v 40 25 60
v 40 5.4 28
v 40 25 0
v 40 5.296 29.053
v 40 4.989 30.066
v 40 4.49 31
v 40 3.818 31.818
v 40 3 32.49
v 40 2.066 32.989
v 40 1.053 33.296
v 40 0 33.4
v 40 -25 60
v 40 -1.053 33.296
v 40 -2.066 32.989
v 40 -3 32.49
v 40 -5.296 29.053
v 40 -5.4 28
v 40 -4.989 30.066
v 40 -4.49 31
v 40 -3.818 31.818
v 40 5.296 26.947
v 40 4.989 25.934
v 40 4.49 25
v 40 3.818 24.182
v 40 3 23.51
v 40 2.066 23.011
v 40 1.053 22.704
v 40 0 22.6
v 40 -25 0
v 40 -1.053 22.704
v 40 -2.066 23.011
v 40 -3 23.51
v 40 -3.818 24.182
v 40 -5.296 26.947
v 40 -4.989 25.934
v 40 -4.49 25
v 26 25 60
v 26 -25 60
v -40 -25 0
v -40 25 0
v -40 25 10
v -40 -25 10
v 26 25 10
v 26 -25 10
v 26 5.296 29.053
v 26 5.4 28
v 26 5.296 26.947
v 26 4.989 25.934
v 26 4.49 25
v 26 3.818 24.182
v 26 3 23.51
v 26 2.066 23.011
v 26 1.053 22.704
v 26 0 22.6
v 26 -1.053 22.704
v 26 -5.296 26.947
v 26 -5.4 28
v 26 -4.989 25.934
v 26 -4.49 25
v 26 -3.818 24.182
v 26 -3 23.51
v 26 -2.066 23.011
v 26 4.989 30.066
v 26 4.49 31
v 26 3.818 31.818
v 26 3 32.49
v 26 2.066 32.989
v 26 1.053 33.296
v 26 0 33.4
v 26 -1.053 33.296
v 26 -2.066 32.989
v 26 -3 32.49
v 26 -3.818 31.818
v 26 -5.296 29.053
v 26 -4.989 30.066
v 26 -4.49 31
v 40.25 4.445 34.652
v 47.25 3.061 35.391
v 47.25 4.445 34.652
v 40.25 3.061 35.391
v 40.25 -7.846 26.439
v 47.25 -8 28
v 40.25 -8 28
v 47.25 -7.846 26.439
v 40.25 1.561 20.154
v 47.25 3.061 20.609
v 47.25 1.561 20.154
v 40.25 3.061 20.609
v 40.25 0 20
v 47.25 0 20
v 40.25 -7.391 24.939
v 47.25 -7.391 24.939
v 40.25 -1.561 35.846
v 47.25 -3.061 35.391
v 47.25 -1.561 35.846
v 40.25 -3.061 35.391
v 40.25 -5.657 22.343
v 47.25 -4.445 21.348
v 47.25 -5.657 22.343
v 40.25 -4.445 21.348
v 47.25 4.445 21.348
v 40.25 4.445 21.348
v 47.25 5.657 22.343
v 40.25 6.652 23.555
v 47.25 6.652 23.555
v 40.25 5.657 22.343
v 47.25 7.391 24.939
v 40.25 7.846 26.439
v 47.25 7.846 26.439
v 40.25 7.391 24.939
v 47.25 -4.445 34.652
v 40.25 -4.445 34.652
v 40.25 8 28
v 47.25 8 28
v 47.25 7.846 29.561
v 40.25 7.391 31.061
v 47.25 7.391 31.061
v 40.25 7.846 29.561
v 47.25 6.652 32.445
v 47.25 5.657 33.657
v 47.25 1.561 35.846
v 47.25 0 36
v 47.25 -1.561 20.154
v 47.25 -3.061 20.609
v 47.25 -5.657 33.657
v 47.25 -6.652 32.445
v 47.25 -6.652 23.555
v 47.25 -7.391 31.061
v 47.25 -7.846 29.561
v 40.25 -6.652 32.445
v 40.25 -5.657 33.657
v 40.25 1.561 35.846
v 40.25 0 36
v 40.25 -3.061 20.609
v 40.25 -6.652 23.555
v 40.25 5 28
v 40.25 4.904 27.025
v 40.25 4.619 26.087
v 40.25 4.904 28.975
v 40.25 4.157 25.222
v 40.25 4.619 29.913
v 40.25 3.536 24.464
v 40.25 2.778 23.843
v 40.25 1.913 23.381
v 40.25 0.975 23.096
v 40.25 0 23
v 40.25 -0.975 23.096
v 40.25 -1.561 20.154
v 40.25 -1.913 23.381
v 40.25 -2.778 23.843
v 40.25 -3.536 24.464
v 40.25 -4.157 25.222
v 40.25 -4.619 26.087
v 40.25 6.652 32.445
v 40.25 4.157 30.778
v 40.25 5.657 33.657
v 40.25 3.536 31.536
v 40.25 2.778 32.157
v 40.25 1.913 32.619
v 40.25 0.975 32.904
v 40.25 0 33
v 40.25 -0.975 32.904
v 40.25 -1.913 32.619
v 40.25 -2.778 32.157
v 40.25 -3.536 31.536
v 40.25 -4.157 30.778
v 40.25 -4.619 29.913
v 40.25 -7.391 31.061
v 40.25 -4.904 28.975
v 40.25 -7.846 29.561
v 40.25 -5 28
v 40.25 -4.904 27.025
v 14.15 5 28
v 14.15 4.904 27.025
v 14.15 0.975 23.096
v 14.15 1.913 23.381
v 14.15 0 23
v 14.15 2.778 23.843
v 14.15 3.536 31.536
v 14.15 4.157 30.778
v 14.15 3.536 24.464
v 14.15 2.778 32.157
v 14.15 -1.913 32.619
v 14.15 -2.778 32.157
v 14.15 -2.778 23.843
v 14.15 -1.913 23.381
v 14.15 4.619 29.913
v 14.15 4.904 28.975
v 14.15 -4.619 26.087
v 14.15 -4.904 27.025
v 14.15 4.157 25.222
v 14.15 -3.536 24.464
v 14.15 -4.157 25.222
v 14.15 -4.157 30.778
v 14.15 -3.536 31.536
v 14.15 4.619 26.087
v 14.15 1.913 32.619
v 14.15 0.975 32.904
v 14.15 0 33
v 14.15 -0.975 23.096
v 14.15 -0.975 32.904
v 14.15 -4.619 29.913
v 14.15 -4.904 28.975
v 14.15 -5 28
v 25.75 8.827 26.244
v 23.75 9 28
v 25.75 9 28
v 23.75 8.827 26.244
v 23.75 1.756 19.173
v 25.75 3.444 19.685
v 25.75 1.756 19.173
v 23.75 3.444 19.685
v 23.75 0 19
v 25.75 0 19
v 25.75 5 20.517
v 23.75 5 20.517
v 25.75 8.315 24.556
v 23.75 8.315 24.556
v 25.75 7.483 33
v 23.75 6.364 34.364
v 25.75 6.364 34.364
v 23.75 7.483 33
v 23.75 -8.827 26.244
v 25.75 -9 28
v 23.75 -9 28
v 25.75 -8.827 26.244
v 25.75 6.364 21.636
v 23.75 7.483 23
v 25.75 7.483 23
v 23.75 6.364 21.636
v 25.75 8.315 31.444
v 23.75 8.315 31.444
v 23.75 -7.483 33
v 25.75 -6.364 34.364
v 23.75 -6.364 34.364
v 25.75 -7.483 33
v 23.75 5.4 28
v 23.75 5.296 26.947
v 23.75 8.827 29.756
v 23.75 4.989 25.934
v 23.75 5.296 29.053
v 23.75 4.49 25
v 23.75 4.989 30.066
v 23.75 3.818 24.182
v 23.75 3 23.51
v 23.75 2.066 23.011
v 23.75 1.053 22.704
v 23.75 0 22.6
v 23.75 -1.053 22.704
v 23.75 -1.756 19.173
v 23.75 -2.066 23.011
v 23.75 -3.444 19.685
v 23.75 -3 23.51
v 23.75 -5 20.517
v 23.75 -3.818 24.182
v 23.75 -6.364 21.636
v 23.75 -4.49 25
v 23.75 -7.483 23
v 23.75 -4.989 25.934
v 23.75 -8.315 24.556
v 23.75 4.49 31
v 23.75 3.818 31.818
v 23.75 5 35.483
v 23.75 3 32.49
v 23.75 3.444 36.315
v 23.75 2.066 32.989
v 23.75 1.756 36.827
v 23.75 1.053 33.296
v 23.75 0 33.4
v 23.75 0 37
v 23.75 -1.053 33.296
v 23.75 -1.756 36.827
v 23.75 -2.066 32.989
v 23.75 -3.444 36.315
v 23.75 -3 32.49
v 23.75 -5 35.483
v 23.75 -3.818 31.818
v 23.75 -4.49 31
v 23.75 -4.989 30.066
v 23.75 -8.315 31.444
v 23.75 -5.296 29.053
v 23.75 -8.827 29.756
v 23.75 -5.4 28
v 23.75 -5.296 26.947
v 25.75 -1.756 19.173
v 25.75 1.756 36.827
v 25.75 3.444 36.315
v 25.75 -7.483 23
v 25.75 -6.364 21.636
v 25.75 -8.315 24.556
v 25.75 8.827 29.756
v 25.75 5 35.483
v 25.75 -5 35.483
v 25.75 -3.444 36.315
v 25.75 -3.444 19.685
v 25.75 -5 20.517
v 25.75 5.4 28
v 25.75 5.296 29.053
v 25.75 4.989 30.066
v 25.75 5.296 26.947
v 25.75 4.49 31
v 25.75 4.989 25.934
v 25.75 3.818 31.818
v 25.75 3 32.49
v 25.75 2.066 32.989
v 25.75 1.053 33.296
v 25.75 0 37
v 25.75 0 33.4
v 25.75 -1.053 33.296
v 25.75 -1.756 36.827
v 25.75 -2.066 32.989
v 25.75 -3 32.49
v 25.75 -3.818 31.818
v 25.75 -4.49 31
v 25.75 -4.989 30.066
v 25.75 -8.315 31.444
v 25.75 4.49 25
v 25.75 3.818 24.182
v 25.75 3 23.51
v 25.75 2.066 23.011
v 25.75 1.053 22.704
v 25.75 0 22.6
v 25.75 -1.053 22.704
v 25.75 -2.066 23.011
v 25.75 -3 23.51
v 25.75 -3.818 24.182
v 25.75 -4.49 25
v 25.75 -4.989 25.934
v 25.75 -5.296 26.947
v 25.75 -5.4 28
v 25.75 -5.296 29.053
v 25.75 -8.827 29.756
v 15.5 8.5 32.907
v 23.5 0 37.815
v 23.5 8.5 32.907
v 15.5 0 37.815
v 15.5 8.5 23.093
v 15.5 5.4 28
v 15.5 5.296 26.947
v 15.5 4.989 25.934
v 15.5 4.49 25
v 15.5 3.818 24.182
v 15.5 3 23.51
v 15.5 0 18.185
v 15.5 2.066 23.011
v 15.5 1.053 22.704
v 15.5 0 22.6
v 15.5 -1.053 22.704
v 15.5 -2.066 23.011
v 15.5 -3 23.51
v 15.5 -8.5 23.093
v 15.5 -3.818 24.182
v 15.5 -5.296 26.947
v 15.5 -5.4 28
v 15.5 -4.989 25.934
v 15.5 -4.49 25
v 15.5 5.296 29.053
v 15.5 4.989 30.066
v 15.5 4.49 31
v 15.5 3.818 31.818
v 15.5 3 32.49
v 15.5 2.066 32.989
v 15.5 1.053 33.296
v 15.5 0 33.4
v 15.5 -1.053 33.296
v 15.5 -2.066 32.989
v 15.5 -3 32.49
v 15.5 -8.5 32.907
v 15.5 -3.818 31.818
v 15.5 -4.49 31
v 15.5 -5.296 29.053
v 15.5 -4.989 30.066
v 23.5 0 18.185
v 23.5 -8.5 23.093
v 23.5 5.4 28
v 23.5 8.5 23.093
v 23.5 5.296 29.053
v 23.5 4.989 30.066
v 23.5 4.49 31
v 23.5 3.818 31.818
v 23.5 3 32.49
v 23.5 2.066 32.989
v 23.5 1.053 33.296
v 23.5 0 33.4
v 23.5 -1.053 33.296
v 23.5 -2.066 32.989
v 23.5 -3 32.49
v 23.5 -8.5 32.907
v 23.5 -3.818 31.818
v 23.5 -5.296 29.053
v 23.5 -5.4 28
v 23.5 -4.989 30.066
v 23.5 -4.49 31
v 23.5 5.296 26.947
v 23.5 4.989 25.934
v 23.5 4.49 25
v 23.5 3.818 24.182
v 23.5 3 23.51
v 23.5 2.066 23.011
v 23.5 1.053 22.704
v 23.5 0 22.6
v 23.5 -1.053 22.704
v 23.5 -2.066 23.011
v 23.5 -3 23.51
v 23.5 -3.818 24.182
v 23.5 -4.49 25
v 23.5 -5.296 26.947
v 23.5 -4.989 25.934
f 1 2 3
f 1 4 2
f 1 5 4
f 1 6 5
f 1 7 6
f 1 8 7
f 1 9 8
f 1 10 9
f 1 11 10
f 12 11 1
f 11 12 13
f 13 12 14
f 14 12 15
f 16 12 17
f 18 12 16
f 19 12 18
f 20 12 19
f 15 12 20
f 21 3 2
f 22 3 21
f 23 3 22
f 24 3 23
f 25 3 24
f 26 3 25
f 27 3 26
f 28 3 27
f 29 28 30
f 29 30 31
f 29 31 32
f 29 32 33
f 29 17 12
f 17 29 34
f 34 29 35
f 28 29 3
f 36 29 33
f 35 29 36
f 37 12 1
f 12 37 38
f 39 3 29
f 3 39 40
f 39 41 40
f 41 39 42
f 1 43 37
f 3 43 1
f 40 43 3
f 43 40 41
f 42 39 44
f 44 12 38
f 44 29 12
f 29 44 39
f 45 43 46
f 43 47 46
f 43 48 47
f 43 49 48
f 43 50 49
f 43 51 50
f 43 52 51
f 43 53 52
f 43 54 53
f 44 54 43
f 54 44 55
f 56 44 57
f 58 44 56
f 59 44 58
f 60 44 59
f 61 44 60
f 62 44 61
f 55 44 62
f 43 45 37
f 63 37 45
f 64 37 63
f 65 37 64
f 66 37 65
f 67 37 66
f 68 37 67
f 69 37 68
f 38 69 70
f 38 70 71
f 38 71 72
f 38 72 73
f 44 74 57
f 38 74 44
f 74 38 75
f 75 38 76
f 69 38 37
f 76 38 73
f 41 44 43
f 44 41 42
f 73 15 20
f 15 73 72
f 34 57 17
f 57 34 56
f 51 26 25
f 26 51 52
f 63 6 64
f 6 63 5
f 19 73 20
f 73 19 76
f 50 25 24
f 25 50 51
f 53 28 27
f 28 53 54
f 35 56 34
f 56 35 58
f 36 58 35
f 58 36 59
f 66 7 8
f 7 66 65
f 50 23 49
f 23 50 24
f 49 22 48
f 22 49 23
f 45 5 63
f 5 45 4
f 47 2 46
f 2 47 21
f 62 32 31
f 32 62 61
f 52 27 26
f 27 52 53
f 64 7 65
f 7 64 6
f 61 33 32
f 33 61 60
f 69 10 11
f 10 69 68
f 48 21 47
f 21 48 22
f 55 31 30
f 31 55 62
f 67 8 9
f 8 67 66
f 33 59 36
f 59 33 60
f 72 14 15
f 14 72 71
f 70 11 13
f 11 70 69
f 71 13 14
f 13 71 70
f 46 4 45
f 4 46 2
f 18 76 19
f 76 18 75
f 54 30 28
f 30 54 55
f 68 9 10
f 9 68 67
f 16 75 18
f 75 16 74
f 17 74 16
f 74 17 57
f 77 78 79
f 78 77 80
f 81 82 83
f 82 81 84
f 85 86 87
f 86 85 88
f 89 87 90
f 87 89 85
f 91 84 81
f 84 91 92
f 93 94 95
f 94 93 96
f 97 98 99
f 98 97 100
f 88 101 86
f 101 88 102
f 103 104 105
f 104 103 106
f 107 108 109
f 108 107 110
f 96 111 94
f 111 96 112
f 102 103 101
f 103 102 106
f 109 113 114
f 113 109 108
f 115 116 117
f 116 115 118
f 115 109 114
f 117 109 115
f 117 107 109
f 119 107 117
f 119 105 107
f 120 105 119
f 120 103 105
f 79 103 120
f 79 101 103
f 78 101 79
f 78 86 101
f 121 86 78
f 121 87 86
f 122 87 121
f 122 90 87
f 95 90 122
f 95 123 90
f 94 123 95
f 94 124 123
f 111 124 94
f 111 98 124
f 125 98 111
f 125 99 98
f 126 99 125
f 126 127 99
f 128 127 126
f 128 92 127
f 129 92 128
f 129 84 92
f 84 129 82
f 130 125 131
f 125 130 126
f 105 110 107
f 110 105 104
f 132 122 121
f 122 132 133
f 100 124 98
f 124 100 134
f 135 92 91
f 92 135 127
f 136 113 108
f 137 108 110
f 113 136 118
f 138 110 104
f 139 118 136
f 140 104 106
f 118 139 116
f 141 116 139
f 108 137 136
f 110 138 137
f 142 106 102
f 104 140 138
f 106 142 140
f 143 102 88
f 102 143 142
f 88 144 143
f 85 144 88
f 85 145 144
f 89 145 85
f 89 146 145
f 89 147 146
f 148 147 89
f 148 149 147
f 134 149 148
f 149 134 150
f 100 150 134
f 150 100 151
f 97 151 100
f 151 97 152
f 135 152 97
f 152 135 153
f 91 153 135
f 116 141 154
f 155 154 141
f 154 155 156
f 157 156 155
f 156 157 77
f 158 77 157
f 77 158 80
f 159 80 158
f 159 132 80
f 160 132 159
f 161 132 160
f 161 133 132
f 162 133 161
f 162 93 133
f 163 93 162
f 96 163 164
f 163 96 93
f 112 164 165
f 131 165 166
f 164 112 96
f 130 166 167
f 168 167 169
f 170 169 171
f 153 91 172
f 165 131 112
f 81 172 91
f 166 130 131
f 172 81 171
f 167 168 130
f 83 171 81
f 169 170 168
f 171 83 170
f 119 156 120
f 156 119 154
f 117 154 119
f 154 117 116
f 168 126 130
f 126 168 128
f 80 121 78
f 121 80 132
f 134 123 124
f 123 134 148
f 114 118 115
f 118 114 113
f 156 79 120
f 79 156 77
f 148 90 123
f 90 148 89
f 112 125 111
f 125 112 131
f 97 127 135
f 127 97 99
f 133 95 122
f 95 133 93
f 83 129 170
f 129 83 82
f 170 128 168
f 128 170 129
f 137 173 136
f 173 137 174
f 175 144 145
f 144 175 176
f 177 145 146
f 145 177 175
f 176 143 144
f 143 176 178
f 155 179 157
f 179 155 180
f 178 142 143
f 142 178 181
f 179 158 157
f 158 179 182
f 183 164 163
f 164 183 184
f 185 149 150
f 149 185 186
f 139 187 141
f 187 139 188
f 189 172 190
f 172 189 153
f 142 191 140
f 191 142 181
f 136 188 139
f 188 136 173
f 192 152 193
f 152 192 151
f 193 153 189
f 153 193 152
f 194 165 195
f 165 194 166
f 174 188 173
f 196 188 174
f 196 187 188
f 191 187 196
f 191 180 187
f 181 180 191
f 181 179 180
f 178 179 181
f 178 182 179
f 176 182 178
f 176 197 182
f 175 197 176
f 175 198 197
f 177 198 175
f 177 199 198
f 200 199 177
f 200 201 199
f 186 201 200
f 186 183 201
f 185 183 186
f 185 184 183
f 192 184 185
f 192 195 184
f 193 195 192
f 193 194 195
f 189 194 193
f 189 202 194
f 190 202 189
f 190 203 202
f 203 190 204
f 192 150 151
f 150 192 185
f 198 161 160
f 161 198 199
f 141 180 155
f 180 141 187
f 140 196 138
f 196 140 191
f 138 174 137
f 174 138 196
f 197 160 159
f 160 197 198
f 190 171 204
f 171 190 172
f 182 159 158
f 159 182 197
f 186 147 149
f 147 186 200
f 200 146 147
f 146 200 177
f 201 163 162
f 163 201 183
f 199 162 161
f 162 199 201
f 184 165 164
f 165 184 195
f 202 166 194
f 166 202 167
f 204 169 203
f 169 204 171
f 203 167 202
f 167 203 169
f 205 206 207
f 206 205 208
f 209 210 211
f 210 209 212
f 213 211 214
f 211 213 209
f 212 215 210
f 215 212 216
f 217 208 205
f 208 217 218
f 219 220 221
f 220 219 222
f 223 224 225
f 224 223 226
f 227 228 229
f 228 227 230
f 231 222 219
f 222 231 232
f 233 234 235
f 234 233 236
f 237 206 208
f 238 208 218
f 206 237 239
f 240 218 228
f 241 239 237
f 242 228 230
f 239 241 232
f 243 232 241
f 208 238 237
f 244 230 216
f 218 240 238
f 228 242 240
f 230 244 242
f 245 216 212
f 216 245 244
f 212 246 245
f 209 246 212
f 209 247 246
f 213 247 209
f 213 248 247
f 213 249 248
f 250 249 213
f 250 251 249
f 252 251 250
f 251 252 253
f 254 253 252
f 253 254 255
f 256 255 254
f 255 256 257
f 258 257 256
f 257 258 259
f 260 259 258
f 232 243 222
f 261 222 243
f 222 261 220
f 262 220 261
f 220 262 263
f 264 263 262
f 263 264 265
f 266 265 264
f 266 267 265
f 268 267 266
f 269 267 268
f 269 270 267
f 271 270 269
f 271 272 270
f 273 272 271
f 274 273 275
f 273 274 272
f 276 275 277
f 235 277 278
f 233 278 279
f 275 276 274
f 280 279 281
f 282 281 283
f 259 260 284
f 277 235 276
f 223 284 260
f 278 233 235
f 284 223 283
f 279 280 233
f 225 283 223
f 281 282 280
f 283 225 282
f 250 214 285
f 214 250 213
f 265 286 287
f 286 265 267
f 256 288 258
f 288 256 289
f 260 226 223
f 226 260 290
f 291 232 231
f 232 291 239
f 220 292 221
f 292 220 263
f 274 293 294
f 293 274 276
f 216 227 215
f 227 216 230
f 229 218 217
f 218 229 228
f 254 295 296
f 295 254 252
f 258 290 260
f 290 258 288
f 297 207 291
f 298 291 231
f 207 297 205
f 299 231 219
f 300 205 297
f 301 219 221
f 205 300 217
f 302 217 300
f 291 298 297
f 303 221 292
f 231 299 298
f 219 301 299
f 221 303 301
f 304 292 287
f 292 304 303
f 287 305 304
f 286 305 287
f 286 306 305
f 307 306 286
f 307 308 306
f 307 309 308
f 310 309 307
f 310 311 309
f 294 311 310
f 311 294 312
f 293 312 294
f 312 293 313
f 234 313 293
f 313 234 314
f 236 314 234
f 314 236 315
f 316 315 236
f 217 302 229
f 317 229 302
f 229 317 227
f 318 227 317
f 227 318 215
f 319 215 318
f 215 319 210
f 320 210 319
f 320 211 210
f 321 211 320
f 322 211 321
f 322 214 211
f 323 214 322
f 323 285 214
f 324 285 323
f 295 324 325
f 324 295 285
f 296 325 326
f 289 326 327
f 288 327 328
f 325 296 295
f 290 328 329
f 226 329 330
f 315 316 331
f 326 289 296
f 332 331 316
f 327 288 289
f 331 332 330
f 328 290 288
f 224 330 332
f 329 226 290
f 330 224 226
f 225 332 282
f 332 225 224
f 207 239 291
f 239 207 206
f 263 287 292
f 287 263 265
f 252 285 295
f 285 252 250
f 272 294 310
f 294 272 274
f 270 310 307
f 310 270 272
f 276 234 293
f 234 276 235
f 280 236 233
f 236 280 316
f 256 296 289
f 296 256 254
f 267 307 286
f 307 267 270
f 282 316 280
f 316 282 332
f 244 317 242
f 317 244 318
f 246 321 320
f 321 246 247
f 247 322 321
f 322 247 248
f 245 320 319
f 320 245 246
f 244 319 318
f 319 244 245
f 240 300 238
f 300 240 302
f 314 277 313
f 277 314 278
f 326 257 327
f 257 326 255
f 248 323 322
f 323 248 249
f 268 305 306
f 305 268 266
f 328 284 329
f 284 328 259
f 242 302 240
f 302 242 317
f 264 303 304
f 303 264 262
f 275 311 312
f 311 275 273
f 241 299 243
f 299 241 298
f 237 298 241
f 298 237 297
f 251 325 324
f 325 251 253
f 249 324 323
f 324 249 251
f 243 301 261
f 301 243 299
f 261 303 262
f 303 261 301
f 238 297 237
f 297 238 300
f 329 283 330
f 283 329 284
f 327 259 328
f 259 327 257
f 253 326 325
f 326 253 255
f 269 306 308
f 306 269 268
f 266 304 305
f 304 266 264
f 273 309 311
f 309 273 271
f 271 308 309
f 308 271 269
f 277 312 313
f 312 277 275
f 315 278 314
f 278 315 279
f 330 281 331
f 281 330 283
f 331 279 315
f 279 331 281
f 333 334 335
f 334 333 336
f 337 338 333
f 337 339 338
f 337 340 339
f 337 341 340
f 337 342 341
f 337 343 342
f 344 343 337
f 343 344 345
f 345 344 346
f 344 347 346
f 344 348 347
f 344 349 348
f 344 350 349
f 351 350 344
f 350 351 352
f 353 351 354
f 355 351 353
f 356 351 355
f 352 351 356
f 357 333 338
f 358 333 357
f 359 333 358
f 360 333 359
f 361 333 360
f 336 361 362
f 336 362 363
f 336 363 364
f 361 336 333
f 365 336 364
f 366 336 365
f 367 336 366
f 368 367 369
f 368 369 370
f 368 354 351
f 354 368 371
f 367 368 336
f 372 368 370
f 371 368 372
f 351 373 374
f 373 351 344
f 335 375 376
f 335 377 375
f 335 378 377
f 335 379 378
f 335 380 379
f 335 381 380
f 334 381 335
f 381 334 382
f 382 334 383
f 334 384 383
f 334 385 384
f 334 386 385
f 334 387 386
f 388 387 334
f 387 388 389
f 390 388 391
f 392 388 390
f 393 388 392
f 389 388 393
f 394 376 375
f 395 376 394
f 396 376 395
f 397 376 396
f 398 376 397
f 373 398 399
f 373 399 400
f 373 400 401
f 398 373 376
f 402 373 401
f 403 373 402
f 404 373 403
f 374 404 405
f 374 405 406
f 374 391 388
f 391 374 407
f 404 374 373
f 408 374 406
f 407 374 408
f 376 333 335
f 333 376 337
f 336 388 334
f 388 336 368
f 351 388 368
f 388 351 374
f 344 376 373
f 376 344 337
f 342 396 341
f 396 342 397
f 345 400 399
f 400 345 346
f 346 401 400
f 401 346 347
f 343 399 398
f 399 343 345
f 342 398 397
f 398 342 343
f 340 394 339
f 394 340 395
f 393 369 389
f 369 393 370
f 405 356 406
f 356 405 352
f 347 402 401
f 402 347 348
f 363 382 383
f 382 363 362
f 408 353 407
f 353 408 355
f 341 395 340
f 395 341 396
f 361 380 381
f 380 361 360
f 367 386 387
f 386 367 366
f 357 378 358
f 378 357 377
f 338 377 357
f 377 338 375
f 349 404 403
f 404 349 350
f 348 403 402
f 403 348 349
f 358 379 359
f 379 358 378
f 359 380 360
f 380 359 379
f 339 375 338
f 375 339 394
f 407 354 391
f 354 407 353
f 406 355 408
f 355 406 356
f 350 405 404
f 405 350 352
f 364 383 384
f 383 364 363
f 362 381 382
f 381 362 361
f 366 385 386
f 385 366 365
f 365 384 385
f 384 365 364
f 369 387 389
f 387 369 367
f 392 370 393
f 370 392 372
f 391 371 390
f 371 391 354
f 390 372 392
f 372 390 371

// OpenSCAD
$fn = 32;

// ------------------------------------------------------------------------
// Bolted bracket: 80 x 50 mm bracket with 1 bolt joints
// Every part is its own module, assembly() places them once.
// ------------------------------------------------------------------------

// --- part 1 ---
module bracket() {
  difference() {
    translate([-40, -25, 0]) cube([80, 50, 60]);
    translate([-41, -26, 10]) cube([67, 52, 51]);
    translate([33, 0, 28]) rotate([0, 90, 0]) cylinder(h = 16, d = 10.8, center = true);
  }
}

// --- part 2 ---
module bolt() {
  cylinder(h = 7, d = 16);
  translate([0, 0, -26.1]) cylinder(h = 26.1, d = 10);
}

// --- part 3 ---
module washer() {
  difference() {
      translate([0, 0, 0]) cylinder(h = 2, d = 18);
      translate([0, 0, -1]) cylinder(h = 4, d = 10.8);
    }
}

// --- part 4 ---
module nut() {
  difference() {
    linear_extrude(height = 8) polygon(points = [[9.815, 0], [4.907, 8.5], [-4.907, 8.5], [-9.815, 0], [-4.907, -8.5], [4.907, -8.5]]);
    translate([0, 0, -1]) cylinder(h = 10, d = 10.8);
  }
}

// --- assembly ---
module assembly() {
  translate([0, 0, 0]) rotate([0, 0, 0]) bracket();
  translate([40.25, 0, 28]) rotate([0, 90, 0]) bolt();
  translate([23.75, 0, 28]) rotate([0, 90, 0]) washer();
  translate([15.5, 0, 28]) rotate([0, 90, 0]) nut();
}

assembly();
